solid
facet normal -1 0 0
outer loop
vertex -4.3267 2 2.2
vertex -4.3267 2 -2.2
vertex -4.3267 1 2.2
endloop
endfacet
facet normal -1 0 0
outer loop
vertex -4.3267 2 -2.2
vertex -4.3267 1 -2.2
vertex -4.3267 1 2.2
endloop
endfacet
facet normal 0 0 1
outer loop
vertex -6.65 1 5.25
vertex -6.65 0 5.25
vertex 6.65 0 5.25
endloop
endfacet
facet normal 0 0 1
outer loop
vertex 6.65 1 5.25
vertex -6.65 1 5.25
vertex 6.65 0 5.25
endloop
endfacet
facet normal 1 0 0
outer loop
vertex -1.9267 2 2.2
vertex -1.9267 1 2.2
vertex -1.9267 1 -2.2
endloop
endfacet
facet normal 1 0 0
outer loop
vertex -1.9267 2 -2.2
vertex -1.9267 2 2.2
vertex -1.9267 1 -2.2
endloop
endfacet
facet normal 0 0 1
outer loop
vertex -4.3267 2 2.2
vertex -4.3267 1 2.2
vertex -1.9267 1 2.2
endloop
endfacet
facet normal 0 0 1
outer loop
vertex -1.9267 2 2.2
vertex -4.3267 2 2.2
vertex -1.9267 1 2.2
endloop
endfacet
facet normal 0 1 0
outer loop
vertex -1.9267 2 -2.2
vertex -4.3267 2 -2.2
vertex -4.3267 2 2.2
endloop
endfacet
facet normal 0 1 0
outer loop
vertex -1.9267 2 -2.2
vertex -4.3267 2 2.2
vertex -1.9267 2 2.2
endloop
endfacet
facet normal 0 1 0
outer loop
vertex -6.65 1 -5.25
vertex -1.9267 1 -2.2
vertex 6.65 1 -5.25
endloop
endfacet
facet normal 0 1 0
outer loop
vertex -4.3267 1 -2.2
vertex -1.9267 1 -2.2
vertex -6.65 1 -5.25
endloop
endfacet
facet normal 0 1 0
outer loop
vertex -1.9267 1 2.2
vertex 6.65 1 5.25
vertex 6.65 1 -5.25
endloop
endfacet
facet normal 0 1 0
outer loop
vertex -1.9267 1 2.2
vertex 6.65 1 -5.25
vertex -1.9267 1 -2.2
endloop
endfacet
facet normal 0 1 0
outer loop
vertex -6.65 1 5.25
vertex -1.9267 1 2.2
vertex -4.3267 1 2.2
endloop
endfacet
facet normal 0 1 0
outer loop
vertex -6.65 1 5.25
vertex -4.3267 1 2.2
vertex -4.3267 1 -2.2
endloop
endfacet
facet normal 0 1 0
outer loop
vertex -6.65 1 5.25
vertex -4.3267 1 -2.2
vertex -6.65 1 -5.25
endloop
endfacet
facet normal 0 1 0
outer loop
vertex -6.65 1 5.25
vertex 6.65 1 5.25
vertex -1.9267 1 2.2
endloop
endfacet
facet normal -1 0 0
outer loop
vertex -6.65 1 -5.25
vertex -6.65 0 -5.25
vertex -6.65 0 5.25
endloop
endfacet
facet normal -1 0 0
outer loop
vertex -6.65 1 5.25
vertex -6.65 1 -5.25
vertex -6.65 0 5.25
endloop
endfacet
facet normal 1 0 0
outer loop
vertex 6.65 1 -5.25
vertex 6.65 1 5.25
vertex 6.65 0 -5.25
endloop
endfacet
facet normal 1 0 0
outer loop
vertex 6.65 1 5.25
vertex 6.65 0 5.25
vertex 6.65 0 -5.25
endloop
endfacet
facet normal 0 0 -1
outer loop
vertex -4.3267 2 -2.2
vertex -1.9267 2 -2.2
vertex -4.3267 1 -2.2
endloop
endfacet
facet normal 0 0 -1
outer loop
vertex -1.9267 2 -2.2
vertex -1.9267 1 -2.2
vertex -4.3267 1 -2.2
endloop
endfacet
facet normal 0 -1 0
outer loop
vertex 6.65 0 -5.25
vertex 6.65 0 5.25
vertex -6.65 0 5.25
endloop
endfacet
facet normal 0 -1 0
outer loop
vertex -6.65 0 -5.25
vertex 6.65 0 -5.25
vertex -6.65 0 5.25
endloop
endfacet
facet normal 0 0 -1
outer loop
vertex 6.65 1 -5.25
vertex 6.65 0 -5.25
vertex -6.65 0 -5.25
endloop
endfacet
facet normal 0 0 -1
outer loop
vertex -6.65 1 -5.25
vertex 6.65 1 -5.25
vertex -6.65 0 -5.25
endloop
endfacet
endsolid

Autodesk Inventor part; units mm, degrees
ref_plane "YZ Plane" through (0, 0, 0) normal (1, 0, 0) x (0, 1, 0)
ref_plane "XZ Plane" through (0, 0, 0) normal (0, 1, 0) x (-1, 0, 0)
ref_plane "XY Plane" through (0, 0, 0) normal (0, 0, 1) x (1, 0, 0)
sketch "Szkic1" plane through (0, 0, 0) normal (0, 1, 0) x (-1, 0, 0)
  line L0 (6.65, 5.25) -> (-6.65, 5.25)
  line L1 (-6.65, 5.25) -> (-6.65, -5.25)
  line L2 (-6.65, -5.25) -> (6.65, -5.25)
  line L3 (6.65, -5.25) -> (6.65, 5.25)
  point P0 (0, 0)
  dimension "d0" = 10.5
  dimension "d1" = 5.25
  dimension "d2" = 6.65
  dimension "d3" = 13.3
extrude "Wyciągnięcie proste1" add sketch "Szkic1" along normal blind 1
sketch "Szkic2" plane through (0, 1, 0) normal (0, 1, 0) x (1, 0, 0)
  line L0 (-4.3267, -2.2) -> (-1.9267, -2.2)
  line L1 (-1.9267, -2.2) -> (-1.9267, 2.2)
  line L2 (-1.9267, 2.2) -> (-4.3267, 2.2)
  line L3 (-4.3267, 2.2) -> (-4.3267, -2.2)
  point P0 (0, 0)
  dimension "d6" = 4.4
  dimension "d7" = 2.4
  dimension "d8" = 2.2
extrude "Wyciągnięcie proste2" add sketch "Szkic2" along normal blind 1
properties part number "vl"
